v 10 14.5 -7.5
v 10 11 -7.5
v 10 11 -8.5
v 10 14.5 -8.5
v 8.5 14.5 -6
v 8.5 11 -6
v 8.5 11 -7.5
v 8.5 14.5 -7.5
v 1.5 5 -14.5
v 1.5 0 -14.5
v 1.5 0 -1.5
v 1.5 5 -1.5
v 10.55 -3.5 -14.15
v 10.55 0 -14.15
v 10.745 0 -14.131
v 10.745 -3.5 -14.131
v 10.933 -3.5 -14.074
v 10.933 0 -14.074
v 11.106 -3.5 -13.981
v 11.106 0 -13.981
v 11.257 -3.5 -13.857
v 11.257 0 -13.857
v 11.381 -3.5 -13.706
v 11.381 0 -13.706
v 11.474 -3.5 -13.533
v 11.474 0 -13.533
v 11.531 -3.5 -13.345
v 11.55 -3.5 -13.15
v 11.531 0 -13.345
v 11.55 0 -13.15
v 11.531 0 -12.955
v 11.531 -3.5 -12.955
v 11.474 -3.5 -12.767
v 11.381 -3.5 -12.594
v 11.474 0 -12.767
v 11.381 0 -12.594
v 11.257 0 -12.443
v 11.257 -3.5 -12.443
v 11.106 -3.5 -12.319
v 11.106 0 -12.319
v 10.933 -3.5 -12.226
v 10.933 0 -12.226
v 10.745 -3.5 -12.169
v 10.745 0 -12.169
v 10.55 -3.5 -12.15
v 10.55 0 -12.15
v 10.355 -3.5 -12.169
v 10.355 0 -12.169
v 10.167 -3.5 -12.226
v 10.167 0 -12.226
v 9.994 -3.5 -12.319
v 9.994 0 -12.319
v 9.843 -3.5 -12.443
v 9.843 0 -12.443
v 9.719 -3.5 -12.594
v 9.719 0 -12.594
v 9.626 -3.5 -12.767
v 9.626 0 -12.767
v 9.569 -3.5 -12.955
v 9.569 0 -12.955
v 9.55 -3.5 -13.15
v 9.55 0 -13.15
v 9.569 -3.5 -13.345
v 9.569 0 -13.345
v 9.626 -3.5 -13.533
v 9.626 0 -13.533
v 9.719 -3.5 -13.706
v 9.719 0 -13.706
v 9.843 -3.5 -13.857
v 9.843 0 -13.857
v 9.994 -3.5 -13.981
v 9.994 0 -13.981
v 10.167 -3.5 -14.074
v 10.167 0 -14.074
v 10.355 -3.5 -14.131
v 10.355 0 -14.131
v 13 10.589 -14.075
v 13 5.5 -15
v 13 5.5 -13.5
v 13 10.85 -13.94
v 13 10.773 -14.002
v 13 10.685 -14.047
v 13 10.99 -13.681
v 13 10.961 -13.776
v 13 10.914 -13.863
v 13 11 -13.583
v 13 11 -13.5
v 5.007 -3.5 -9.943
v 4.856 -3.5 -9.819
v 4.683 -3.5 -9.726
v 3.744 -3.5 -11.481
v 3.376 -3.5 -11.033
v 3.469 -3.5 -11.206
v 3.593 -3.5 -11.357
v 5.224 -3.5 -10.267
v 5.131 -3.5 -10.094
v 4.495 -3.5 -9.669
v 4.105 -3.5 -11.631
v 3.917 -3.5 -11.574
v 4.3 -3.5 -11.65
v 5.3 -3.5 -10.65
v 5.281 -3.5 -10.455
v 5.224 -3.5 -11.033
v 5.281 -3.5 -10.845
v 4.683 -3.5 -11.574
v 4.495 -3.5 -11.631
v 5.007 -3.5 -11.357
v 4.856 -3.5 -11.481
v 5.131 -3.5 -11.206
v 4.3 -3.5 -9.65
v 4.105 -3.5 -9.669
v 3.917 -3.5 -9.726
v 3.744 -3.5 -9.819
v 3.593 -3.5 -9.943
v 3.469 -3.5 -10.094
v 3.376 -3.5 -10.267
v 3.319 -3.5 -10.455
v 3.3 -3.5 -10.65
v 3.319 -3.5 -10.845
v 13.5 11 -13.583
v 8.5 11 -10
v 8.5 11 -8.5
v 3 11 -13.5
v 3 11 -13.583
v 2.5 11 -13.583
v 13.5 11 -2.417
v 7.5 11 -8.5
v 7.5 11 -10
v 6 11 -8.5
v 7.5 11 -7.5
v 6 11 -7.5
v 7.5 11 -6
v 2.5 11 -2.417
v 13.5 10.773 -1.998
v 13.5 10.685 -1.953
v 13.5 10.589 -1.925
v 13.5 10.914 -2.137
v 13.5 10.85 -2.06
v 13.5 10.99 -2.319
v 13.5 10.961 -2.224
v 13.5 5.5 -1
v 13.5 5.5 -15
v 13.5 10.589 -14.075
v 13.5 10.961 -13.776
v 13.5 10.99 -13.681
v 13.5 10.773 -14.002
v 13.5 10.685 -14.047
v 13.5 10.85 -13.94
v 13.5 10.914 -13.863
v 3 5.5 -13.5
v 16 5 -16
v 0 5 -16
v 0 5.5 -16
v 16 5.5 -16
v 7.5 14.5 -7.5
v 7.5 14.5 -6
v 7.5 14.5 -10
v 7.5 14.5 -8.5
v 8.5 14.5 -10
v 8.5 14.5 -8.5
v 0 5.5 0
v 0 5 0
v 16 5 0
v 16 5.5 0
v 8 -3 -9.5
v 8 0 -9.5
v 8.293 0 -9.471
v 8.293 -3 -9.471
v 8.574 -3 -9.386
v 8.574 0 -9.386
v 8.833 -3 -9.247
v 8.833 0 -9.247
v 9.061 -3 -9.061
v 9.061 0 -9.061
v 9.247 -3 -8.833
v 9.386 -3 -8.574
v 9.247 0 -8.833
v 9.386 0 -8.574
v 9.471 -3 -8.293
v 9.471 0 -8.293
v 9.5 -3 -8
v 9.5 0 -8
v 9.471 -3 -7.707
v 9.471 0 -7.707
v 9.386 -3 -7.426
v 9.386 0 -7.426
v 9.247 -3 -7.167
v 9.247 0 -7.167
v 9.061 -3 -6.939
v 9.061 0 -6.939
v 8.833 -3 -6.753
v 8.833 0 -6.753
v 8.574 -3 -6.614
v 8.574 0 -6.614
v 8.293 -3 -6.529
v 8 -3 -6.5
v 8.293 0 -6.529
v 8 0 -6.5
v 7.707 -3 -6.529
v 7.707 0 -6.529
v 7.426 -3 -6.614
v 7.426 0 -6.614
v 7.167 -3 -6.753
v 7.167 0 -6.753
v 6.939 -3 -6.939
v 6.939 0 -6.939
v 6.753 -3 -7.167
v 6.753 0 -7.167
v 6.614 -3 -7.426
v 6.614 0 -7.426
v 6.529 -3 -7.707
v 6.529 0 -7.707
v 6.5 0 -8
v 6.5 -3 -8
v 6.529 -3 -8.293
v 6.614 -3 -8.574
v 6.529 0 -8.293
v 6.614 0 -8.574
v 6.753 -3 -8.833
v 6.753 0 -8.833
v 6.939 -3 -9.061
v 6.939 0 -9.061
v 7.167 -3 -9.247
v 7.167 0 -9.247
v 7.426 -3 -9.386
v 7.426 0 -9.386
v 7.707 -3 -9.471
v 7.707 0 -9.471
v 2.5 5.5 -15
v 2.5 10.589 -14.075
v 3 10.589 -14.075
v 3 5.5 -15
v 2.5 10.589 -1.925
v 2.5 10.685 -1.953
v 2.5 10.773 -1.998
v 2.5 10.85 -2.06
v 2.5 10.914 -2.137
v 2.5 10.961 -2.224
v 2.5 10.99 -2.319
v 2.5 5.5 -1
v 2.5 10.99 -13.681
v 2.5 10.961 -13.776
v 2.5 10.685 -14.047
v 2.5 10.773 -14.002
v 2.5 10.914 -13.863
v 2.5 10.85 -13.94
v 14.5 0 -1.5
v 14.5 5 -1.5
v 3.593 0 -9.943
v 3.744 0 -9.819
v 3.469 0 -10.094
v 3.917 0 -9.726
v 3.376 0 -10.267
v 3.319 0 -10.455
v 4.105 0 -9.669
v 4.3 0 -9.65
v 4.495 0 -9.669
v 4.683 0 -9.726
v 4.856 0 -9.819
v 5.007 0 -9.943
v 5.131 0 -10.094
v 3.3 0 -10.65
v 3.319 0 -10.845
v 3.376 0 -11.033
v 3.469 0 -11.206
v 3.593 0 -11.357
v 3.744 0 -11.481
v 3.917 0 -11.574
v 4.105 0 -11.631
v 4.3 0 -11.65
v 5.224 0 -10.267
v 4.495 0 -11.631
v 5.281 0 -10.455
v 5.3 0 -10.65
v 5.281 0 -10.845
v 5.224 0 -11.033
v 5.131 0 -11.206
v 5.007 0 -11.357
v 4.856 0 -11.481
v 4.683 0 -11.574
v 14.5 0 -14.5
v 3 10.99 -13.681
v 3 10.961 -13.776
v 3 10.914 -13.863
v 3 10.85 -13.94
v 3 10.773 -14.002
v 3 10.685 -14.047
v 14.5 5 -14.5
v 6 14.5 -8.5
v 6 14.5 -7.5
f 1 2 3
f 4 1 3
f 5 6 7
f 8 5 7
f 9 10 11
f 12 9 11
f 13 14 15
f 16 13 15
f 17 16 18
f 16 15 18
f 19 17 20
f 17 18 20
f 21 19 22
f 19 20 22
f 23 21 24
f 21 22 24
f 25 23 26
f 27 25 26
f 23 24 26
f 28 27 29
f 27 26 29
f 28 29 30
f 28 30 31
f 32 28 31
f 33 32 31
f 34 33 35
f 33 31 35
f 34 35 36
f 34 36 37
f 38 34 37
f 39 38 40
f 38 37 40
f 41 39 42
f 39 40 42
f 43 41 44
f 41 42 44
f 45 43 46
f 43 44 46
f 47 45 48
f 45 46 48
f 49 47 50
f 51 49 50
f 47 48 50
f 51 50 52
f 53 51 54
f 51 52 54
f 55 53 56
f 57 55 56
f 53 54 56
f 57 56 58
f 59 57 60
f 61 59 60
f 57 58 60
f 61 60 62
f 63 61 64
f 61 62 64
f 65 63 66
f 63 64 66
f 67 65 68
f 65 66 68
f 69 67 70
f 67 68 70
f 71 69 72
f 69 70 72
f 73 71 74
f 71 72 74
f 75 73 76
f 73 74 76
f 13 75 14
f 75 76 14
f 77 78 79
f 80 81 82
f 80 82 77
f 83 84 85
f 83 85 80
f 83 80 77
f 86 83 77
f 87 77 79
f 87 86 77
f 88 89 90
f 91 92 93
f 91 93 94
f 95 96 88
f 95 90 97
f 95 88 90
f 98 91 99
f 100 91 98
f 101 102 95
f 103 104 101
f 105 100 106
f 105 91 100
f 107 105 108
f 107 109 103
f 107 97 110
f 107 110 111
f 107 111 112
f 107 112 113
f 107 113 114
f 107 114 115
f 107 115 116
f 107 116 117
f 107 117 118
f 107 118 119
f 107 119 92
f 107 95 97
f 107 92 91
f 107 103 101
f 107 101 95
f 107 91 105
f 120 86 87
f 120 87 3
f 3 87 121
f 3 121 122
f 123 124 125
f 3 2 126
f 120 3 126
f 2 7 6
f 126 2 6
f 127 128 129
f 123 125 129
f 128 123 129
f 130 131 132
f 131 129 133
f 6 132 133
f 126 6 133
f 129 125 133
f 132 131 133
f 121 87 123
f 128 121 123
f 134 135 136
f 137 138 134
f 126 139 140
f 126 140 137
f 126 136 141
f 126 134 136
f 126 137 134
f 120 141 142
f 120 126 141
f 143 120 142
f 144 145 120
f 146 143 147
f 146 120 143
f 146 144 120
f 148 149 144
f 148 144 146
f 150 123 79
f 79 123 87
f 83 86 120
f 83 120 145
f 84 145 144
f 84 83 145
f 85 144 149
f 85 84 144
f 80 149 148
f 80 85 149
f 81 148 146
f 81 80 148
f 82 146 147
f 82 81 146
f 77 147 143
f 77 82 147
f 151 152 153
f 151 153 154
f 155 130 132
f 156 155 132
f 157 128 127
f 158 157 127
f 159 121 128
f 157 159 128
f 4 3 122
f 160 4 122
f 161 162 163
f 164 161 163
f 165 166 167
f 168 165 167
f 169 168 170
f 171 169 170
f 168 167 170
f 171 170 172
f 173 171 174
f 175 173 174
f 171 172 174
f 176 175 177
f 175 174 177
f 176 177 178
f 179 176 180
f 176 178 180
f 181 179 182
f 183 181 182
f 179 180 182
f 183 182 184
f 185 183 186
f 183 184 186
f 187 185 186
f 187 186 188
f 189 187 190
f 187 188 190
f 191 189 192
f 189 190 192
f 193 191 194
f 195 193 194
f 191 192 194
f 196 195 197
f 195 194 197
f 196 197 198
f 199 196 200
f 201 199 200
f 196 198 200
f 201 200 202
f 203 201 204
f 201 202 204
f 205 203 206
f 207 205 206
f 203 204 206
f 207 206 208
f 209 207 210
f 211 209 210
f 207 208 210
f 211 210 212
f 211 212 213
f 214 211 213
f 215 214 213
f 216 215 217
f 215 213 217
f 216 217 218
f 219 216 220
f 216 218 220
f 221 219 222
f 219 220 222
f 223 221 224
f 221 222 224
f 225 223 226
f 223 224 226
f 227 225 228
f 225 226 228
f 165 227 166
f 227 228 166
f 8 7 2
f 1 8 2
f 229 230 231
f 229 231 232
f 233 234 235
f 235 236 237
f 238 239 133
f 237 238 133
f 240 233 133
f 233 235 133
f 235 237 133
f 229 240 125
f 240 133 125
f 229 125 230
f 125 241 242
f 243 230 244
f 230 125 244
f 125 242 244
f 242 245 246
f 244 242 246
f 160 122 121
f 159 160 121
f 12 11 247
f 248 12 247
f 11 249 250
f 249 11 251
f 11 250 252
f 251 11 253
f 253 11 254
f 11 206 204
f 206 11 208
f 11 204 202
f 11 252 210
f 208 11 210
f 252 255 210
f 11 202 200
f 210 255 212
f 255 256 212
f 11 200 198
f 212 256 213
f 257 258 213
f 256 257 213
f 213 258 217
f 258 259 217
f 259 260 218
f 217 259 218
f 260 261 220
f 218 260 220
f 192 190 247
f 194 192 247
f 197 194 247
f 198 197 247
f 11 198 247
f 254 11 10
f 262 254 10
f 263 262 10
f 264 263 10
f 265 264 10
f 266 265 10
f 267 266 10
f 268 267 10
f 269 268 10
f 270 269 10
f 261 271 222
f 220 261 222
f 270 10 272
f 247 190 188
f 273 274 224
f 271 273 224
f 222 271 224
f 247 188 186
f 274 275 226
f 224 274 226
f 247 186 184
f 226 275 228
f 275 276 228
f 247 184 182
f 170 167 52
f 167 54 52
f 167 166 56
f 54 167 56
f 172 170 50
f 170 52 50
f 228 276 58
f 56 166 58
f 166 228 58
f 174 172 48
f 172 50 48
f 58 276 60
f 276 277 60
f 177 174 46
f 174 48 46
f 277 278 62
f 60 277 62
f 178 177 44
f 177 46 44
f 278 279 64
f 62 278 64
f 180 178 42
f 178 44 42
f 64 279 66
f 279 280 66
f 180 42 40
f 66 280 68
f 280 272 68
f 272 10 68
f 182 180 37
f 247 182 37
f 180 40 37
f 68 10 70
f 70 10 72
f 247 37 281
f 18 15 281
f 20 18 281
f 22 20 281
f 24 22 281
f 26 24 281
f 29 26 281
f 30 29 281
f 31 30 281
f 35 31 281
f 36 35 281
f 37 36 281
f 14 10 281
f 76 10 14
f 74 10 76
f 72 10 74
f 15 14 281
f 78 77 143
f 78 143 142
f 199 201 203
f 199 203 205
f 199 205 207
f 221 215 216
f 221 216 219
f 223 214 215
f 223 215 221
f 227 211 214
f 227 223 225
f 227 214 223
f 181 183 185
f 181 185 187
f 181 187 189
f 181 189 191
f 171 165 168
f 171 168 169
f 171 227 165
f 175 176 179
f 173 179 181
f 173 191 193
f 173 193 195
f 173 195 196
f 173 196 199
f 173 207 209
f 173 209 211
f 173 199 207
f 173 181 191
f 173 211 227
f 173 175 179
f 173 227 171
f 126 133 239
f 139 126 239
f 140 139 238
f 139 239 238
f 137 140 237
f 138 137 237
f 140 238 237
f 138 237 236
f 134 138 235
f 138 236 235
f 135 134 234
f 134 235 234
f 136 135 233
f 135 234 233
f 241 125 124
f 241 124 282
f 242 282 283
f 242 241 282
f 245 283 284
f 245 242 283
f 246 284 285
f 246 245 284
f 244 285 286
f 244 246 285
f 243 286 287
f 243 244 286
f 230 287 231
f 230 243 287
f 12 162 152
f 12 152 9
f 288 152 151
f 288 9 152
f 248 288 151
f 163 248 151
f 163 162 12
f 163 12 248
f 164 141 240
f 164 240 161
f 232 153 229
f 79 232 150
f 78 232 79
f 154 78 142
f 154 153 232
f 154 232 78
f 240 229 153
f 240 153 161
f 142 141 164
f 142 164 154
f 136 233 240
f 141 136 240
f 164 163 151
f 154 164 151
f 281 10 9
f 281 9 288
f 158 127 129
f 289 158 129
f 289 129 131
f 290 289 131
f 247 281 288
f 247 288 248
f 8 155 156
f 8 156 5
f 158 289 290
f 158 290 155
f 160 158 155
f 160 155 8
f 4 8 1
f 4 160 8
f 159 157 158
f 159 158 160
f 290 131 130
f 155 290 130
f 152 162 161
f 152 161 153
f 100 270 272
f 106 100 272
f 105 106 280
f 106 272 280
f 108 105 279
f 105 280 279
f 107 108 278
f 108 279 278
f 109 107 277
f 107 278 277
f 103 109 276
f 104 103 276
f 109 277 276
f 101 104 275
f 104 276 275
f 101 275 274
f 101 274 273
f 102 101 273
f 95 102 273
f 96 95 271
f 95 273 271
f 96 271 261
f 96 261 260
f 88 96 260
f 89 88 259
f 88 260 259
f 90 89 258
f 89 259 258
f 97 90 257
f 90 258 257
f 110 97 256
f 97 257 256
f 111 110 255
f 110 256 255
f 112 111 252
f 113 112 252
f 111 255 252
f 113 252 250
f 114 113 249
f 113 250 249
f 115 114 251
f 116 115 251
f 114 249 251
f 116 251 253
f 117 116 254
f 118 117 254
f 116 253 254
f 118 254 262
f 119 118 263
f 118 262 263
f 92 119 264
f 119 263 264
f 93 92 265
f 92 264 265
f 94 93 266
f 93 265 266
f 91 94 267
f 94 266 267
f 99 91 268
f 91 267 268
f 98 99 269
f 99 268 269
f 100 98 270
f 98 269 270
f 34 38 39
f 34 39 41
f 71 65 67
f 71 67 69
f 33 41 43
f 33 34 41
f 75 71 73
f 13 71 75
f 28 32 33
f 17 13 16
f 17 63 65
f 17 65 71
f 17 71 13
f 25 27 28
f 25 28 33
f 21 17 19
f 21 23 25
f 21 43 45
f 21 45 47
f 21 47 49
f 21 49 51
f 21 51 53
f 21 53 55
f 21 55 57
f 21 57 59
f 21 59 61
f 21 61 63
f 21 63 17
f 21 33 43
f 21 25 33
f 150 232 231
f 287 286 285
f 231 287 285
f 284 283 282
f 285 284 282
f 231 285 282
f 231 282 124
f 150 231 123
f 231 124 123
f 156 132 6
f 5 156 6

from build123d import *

# Parameters (mm, degrees)
SKETCH2_W           = 16
SKETCH2_H           = 16
BOSS_EXTRUDE1_DEPTH = 11
SKETCH3_R           = 1.5
BOSS_EXTRUDE2_DEPTH = 3
SKETCH4_W           = 16
SKETCH4_H           = 16
SKETCH4_W_2         = 13
SKETCH4_H_2         = 13
CUT_EXTRUDE1_DEPTH  = 5
BOSS_EXTRUDE3_DEPTH = 3.5
SKETCH6_W           = 16
SKETCH6_H           = 16
SKETCH6_W_2         = 11
SKETCH6_H_2         = 11
CUT_EXTRUDE2_DEPTH  = 5.5
BOSS_EXTRUDE4_DEPTH = 0.5
BOSS_EXTRUDE5_START = -0.5
BOSS_EXTRUDE5_DEPTH = 0.5
BOSS_EXTRUDE6_DEPTH = 11
SKETCH10_R          = 1
BOSS_EXTRUDE7_DEPTH = 3.5


with BuildPart() as part:
    # Sketch2 → Boss-Extrude1 (new body)
    with BuildSketch(Plane(origin=(0, 0, 0), x_dir=(1, 0, 0), z_dir=(0, 1, 0))):
        with Locations((8, 8)):
            Rectangle(SKETCH2_W, SKETCH2_H)
    extrude(amount=BOSS_EXTRUDE1_DEPTH)

    # Sketch3 → Boss-Extrude2 (add)
    with BuildSketch(Plane.XZ):
        with Locations(Location((8, -8, 0), (0, 0, 270))):
            Circle(SKETCH3_R)
    extrude(amount=BOSS_EXTRUDE2_DEPTH)

    # Sketch4 → Cut-Extrude1 (cut)
    with BuildSketch(Plane.XZ):
        with Locations((8, -8)):
            Rectangle(SKETCH4_W, SKETCH4_H)
        with Locations((8, -8)):
            Rectangle(SKETCH4_W_2, SKETCH4_H_2, mode=Mode.SUBTRACT)
    extrude(amount=-CUT_EXTRUDE1_DEPTH, mode=Mode.SUBTRACT)

    # Sketch5 → Boss-Extrude3 (add)
    with BuildSketch(Plane(origin=(0, 11, 0), x_dir=(1, 0, 0), z_dir=(0, 1, 0))):
        Polygon((7.5, 10), (7.5, 8.5), (6, 8.5), (6, 7.5), (7.5, 7.5), (7.5, 6), (8.5, 6), (8.5, 7.5), (10, 7.5), (10, 8.5), (8.5, 8.5), (8.5, 10), align=None)
    extrude(amount=BOSS_EXTRUDE3_DEPTH)

    # Sketch6 → Cut-Extrude2 (cut)
    with BuildSketch(Plane(origin=(0, 11, 0), x_dir=(1, 0, 0), z_dir=(0, 1, 0))):
        with Locations((8, 8)):
            Rectangle(SKETCH6_W, SKETCH6_H)
        with Locations((8, 8)):
            Rectangle(SKETCH6_W_2, SKETCH6_H_2, mode=Mode.SUBTRACT)
    extrude(amount=-CUT_EXTRUDE2_DEPTH, mode=Mode.SUBTRACT)

    # Sketch7 → Boss-Extrude4 (add)
    with BuildSketch(Plane.ZY.offset(-2.5)):
        with BuildLine():
            Line((-13.5, 11), (-13.582711823, 11))
            ThreePointArc((-13.582711823, 11), (-13.903085543, 10.883875865), (-14.074646778, 10.589442719))
            Line((-14.074646778, 10.589442719), (-15, 5.5))
            Line((-15, 5.5), (-13.5, 5.5))
            Line((-13.5, 5.5), (-13.5, 11))
        make_face()
    extrude(amount=-BOSS_EXTRUDE4_DEPTH)

    # Sketch8 → Boss-Extrude5 (add)
    with BuildSketch(Plane(origin=(13.5, 0, 0), x_dir=(0, 0, -1), z_dir=(1, 0, 0)).offset(BOSS_EXTRUDE5_START)):
        with BuildLine():
            Line((15, 5.5), (13.5, 5.5))
            Line((13.5, 5.5), (13.5, 11))
            Line((13.5, 11), (13.582711823, 11))
            ThreePointArc((13.582711823, 11), (13.903085543, 10.883875865), (14.074646778, 10.589442719))
            Line((14.074646778, 10.589442719), (15, 5.5))
        make_face()
    extrude(amount=BOSS_EXTRUDE5_DEPTH)

    # Sketch9 → Boss-Extrude6 (add)
    with BuildSketch(Plane.ZY.offset(-2.5)):
        with BuildLine():
            Line((-2.5, 11), (-2.417288177, 11))
            ThreePointArc((-2.417288177, 11), (-2.096914457, 10.883875865), (-1.925353222, 10.589442719))
            Line((-1.925353222, 10.589442719), (-1, 5.5))
            Line((-1, 5.5), (-2.5, 5.5))
            Line((-2.5, 5.5), (-2.5, 11))
        make_face()
    extrude(amount=-BOSS_EXTRUDE6_DEPTH)

    # Sketch10 → Boss-Extrude7 (add)
    with BuildSketch(Plane.XZ):
        with Locations(Location((4.3, -10.65, 0), (0, 0, 270))):
            Circle(SKETCH10_R)
        with Locations(Location((10.55, -13.15, 0), (0, 0, 270))):
            Circle(SKETCH10_R)
    extrude(amount=BOSS_EXTRUDE7_DEPTH)


solid = part.part
